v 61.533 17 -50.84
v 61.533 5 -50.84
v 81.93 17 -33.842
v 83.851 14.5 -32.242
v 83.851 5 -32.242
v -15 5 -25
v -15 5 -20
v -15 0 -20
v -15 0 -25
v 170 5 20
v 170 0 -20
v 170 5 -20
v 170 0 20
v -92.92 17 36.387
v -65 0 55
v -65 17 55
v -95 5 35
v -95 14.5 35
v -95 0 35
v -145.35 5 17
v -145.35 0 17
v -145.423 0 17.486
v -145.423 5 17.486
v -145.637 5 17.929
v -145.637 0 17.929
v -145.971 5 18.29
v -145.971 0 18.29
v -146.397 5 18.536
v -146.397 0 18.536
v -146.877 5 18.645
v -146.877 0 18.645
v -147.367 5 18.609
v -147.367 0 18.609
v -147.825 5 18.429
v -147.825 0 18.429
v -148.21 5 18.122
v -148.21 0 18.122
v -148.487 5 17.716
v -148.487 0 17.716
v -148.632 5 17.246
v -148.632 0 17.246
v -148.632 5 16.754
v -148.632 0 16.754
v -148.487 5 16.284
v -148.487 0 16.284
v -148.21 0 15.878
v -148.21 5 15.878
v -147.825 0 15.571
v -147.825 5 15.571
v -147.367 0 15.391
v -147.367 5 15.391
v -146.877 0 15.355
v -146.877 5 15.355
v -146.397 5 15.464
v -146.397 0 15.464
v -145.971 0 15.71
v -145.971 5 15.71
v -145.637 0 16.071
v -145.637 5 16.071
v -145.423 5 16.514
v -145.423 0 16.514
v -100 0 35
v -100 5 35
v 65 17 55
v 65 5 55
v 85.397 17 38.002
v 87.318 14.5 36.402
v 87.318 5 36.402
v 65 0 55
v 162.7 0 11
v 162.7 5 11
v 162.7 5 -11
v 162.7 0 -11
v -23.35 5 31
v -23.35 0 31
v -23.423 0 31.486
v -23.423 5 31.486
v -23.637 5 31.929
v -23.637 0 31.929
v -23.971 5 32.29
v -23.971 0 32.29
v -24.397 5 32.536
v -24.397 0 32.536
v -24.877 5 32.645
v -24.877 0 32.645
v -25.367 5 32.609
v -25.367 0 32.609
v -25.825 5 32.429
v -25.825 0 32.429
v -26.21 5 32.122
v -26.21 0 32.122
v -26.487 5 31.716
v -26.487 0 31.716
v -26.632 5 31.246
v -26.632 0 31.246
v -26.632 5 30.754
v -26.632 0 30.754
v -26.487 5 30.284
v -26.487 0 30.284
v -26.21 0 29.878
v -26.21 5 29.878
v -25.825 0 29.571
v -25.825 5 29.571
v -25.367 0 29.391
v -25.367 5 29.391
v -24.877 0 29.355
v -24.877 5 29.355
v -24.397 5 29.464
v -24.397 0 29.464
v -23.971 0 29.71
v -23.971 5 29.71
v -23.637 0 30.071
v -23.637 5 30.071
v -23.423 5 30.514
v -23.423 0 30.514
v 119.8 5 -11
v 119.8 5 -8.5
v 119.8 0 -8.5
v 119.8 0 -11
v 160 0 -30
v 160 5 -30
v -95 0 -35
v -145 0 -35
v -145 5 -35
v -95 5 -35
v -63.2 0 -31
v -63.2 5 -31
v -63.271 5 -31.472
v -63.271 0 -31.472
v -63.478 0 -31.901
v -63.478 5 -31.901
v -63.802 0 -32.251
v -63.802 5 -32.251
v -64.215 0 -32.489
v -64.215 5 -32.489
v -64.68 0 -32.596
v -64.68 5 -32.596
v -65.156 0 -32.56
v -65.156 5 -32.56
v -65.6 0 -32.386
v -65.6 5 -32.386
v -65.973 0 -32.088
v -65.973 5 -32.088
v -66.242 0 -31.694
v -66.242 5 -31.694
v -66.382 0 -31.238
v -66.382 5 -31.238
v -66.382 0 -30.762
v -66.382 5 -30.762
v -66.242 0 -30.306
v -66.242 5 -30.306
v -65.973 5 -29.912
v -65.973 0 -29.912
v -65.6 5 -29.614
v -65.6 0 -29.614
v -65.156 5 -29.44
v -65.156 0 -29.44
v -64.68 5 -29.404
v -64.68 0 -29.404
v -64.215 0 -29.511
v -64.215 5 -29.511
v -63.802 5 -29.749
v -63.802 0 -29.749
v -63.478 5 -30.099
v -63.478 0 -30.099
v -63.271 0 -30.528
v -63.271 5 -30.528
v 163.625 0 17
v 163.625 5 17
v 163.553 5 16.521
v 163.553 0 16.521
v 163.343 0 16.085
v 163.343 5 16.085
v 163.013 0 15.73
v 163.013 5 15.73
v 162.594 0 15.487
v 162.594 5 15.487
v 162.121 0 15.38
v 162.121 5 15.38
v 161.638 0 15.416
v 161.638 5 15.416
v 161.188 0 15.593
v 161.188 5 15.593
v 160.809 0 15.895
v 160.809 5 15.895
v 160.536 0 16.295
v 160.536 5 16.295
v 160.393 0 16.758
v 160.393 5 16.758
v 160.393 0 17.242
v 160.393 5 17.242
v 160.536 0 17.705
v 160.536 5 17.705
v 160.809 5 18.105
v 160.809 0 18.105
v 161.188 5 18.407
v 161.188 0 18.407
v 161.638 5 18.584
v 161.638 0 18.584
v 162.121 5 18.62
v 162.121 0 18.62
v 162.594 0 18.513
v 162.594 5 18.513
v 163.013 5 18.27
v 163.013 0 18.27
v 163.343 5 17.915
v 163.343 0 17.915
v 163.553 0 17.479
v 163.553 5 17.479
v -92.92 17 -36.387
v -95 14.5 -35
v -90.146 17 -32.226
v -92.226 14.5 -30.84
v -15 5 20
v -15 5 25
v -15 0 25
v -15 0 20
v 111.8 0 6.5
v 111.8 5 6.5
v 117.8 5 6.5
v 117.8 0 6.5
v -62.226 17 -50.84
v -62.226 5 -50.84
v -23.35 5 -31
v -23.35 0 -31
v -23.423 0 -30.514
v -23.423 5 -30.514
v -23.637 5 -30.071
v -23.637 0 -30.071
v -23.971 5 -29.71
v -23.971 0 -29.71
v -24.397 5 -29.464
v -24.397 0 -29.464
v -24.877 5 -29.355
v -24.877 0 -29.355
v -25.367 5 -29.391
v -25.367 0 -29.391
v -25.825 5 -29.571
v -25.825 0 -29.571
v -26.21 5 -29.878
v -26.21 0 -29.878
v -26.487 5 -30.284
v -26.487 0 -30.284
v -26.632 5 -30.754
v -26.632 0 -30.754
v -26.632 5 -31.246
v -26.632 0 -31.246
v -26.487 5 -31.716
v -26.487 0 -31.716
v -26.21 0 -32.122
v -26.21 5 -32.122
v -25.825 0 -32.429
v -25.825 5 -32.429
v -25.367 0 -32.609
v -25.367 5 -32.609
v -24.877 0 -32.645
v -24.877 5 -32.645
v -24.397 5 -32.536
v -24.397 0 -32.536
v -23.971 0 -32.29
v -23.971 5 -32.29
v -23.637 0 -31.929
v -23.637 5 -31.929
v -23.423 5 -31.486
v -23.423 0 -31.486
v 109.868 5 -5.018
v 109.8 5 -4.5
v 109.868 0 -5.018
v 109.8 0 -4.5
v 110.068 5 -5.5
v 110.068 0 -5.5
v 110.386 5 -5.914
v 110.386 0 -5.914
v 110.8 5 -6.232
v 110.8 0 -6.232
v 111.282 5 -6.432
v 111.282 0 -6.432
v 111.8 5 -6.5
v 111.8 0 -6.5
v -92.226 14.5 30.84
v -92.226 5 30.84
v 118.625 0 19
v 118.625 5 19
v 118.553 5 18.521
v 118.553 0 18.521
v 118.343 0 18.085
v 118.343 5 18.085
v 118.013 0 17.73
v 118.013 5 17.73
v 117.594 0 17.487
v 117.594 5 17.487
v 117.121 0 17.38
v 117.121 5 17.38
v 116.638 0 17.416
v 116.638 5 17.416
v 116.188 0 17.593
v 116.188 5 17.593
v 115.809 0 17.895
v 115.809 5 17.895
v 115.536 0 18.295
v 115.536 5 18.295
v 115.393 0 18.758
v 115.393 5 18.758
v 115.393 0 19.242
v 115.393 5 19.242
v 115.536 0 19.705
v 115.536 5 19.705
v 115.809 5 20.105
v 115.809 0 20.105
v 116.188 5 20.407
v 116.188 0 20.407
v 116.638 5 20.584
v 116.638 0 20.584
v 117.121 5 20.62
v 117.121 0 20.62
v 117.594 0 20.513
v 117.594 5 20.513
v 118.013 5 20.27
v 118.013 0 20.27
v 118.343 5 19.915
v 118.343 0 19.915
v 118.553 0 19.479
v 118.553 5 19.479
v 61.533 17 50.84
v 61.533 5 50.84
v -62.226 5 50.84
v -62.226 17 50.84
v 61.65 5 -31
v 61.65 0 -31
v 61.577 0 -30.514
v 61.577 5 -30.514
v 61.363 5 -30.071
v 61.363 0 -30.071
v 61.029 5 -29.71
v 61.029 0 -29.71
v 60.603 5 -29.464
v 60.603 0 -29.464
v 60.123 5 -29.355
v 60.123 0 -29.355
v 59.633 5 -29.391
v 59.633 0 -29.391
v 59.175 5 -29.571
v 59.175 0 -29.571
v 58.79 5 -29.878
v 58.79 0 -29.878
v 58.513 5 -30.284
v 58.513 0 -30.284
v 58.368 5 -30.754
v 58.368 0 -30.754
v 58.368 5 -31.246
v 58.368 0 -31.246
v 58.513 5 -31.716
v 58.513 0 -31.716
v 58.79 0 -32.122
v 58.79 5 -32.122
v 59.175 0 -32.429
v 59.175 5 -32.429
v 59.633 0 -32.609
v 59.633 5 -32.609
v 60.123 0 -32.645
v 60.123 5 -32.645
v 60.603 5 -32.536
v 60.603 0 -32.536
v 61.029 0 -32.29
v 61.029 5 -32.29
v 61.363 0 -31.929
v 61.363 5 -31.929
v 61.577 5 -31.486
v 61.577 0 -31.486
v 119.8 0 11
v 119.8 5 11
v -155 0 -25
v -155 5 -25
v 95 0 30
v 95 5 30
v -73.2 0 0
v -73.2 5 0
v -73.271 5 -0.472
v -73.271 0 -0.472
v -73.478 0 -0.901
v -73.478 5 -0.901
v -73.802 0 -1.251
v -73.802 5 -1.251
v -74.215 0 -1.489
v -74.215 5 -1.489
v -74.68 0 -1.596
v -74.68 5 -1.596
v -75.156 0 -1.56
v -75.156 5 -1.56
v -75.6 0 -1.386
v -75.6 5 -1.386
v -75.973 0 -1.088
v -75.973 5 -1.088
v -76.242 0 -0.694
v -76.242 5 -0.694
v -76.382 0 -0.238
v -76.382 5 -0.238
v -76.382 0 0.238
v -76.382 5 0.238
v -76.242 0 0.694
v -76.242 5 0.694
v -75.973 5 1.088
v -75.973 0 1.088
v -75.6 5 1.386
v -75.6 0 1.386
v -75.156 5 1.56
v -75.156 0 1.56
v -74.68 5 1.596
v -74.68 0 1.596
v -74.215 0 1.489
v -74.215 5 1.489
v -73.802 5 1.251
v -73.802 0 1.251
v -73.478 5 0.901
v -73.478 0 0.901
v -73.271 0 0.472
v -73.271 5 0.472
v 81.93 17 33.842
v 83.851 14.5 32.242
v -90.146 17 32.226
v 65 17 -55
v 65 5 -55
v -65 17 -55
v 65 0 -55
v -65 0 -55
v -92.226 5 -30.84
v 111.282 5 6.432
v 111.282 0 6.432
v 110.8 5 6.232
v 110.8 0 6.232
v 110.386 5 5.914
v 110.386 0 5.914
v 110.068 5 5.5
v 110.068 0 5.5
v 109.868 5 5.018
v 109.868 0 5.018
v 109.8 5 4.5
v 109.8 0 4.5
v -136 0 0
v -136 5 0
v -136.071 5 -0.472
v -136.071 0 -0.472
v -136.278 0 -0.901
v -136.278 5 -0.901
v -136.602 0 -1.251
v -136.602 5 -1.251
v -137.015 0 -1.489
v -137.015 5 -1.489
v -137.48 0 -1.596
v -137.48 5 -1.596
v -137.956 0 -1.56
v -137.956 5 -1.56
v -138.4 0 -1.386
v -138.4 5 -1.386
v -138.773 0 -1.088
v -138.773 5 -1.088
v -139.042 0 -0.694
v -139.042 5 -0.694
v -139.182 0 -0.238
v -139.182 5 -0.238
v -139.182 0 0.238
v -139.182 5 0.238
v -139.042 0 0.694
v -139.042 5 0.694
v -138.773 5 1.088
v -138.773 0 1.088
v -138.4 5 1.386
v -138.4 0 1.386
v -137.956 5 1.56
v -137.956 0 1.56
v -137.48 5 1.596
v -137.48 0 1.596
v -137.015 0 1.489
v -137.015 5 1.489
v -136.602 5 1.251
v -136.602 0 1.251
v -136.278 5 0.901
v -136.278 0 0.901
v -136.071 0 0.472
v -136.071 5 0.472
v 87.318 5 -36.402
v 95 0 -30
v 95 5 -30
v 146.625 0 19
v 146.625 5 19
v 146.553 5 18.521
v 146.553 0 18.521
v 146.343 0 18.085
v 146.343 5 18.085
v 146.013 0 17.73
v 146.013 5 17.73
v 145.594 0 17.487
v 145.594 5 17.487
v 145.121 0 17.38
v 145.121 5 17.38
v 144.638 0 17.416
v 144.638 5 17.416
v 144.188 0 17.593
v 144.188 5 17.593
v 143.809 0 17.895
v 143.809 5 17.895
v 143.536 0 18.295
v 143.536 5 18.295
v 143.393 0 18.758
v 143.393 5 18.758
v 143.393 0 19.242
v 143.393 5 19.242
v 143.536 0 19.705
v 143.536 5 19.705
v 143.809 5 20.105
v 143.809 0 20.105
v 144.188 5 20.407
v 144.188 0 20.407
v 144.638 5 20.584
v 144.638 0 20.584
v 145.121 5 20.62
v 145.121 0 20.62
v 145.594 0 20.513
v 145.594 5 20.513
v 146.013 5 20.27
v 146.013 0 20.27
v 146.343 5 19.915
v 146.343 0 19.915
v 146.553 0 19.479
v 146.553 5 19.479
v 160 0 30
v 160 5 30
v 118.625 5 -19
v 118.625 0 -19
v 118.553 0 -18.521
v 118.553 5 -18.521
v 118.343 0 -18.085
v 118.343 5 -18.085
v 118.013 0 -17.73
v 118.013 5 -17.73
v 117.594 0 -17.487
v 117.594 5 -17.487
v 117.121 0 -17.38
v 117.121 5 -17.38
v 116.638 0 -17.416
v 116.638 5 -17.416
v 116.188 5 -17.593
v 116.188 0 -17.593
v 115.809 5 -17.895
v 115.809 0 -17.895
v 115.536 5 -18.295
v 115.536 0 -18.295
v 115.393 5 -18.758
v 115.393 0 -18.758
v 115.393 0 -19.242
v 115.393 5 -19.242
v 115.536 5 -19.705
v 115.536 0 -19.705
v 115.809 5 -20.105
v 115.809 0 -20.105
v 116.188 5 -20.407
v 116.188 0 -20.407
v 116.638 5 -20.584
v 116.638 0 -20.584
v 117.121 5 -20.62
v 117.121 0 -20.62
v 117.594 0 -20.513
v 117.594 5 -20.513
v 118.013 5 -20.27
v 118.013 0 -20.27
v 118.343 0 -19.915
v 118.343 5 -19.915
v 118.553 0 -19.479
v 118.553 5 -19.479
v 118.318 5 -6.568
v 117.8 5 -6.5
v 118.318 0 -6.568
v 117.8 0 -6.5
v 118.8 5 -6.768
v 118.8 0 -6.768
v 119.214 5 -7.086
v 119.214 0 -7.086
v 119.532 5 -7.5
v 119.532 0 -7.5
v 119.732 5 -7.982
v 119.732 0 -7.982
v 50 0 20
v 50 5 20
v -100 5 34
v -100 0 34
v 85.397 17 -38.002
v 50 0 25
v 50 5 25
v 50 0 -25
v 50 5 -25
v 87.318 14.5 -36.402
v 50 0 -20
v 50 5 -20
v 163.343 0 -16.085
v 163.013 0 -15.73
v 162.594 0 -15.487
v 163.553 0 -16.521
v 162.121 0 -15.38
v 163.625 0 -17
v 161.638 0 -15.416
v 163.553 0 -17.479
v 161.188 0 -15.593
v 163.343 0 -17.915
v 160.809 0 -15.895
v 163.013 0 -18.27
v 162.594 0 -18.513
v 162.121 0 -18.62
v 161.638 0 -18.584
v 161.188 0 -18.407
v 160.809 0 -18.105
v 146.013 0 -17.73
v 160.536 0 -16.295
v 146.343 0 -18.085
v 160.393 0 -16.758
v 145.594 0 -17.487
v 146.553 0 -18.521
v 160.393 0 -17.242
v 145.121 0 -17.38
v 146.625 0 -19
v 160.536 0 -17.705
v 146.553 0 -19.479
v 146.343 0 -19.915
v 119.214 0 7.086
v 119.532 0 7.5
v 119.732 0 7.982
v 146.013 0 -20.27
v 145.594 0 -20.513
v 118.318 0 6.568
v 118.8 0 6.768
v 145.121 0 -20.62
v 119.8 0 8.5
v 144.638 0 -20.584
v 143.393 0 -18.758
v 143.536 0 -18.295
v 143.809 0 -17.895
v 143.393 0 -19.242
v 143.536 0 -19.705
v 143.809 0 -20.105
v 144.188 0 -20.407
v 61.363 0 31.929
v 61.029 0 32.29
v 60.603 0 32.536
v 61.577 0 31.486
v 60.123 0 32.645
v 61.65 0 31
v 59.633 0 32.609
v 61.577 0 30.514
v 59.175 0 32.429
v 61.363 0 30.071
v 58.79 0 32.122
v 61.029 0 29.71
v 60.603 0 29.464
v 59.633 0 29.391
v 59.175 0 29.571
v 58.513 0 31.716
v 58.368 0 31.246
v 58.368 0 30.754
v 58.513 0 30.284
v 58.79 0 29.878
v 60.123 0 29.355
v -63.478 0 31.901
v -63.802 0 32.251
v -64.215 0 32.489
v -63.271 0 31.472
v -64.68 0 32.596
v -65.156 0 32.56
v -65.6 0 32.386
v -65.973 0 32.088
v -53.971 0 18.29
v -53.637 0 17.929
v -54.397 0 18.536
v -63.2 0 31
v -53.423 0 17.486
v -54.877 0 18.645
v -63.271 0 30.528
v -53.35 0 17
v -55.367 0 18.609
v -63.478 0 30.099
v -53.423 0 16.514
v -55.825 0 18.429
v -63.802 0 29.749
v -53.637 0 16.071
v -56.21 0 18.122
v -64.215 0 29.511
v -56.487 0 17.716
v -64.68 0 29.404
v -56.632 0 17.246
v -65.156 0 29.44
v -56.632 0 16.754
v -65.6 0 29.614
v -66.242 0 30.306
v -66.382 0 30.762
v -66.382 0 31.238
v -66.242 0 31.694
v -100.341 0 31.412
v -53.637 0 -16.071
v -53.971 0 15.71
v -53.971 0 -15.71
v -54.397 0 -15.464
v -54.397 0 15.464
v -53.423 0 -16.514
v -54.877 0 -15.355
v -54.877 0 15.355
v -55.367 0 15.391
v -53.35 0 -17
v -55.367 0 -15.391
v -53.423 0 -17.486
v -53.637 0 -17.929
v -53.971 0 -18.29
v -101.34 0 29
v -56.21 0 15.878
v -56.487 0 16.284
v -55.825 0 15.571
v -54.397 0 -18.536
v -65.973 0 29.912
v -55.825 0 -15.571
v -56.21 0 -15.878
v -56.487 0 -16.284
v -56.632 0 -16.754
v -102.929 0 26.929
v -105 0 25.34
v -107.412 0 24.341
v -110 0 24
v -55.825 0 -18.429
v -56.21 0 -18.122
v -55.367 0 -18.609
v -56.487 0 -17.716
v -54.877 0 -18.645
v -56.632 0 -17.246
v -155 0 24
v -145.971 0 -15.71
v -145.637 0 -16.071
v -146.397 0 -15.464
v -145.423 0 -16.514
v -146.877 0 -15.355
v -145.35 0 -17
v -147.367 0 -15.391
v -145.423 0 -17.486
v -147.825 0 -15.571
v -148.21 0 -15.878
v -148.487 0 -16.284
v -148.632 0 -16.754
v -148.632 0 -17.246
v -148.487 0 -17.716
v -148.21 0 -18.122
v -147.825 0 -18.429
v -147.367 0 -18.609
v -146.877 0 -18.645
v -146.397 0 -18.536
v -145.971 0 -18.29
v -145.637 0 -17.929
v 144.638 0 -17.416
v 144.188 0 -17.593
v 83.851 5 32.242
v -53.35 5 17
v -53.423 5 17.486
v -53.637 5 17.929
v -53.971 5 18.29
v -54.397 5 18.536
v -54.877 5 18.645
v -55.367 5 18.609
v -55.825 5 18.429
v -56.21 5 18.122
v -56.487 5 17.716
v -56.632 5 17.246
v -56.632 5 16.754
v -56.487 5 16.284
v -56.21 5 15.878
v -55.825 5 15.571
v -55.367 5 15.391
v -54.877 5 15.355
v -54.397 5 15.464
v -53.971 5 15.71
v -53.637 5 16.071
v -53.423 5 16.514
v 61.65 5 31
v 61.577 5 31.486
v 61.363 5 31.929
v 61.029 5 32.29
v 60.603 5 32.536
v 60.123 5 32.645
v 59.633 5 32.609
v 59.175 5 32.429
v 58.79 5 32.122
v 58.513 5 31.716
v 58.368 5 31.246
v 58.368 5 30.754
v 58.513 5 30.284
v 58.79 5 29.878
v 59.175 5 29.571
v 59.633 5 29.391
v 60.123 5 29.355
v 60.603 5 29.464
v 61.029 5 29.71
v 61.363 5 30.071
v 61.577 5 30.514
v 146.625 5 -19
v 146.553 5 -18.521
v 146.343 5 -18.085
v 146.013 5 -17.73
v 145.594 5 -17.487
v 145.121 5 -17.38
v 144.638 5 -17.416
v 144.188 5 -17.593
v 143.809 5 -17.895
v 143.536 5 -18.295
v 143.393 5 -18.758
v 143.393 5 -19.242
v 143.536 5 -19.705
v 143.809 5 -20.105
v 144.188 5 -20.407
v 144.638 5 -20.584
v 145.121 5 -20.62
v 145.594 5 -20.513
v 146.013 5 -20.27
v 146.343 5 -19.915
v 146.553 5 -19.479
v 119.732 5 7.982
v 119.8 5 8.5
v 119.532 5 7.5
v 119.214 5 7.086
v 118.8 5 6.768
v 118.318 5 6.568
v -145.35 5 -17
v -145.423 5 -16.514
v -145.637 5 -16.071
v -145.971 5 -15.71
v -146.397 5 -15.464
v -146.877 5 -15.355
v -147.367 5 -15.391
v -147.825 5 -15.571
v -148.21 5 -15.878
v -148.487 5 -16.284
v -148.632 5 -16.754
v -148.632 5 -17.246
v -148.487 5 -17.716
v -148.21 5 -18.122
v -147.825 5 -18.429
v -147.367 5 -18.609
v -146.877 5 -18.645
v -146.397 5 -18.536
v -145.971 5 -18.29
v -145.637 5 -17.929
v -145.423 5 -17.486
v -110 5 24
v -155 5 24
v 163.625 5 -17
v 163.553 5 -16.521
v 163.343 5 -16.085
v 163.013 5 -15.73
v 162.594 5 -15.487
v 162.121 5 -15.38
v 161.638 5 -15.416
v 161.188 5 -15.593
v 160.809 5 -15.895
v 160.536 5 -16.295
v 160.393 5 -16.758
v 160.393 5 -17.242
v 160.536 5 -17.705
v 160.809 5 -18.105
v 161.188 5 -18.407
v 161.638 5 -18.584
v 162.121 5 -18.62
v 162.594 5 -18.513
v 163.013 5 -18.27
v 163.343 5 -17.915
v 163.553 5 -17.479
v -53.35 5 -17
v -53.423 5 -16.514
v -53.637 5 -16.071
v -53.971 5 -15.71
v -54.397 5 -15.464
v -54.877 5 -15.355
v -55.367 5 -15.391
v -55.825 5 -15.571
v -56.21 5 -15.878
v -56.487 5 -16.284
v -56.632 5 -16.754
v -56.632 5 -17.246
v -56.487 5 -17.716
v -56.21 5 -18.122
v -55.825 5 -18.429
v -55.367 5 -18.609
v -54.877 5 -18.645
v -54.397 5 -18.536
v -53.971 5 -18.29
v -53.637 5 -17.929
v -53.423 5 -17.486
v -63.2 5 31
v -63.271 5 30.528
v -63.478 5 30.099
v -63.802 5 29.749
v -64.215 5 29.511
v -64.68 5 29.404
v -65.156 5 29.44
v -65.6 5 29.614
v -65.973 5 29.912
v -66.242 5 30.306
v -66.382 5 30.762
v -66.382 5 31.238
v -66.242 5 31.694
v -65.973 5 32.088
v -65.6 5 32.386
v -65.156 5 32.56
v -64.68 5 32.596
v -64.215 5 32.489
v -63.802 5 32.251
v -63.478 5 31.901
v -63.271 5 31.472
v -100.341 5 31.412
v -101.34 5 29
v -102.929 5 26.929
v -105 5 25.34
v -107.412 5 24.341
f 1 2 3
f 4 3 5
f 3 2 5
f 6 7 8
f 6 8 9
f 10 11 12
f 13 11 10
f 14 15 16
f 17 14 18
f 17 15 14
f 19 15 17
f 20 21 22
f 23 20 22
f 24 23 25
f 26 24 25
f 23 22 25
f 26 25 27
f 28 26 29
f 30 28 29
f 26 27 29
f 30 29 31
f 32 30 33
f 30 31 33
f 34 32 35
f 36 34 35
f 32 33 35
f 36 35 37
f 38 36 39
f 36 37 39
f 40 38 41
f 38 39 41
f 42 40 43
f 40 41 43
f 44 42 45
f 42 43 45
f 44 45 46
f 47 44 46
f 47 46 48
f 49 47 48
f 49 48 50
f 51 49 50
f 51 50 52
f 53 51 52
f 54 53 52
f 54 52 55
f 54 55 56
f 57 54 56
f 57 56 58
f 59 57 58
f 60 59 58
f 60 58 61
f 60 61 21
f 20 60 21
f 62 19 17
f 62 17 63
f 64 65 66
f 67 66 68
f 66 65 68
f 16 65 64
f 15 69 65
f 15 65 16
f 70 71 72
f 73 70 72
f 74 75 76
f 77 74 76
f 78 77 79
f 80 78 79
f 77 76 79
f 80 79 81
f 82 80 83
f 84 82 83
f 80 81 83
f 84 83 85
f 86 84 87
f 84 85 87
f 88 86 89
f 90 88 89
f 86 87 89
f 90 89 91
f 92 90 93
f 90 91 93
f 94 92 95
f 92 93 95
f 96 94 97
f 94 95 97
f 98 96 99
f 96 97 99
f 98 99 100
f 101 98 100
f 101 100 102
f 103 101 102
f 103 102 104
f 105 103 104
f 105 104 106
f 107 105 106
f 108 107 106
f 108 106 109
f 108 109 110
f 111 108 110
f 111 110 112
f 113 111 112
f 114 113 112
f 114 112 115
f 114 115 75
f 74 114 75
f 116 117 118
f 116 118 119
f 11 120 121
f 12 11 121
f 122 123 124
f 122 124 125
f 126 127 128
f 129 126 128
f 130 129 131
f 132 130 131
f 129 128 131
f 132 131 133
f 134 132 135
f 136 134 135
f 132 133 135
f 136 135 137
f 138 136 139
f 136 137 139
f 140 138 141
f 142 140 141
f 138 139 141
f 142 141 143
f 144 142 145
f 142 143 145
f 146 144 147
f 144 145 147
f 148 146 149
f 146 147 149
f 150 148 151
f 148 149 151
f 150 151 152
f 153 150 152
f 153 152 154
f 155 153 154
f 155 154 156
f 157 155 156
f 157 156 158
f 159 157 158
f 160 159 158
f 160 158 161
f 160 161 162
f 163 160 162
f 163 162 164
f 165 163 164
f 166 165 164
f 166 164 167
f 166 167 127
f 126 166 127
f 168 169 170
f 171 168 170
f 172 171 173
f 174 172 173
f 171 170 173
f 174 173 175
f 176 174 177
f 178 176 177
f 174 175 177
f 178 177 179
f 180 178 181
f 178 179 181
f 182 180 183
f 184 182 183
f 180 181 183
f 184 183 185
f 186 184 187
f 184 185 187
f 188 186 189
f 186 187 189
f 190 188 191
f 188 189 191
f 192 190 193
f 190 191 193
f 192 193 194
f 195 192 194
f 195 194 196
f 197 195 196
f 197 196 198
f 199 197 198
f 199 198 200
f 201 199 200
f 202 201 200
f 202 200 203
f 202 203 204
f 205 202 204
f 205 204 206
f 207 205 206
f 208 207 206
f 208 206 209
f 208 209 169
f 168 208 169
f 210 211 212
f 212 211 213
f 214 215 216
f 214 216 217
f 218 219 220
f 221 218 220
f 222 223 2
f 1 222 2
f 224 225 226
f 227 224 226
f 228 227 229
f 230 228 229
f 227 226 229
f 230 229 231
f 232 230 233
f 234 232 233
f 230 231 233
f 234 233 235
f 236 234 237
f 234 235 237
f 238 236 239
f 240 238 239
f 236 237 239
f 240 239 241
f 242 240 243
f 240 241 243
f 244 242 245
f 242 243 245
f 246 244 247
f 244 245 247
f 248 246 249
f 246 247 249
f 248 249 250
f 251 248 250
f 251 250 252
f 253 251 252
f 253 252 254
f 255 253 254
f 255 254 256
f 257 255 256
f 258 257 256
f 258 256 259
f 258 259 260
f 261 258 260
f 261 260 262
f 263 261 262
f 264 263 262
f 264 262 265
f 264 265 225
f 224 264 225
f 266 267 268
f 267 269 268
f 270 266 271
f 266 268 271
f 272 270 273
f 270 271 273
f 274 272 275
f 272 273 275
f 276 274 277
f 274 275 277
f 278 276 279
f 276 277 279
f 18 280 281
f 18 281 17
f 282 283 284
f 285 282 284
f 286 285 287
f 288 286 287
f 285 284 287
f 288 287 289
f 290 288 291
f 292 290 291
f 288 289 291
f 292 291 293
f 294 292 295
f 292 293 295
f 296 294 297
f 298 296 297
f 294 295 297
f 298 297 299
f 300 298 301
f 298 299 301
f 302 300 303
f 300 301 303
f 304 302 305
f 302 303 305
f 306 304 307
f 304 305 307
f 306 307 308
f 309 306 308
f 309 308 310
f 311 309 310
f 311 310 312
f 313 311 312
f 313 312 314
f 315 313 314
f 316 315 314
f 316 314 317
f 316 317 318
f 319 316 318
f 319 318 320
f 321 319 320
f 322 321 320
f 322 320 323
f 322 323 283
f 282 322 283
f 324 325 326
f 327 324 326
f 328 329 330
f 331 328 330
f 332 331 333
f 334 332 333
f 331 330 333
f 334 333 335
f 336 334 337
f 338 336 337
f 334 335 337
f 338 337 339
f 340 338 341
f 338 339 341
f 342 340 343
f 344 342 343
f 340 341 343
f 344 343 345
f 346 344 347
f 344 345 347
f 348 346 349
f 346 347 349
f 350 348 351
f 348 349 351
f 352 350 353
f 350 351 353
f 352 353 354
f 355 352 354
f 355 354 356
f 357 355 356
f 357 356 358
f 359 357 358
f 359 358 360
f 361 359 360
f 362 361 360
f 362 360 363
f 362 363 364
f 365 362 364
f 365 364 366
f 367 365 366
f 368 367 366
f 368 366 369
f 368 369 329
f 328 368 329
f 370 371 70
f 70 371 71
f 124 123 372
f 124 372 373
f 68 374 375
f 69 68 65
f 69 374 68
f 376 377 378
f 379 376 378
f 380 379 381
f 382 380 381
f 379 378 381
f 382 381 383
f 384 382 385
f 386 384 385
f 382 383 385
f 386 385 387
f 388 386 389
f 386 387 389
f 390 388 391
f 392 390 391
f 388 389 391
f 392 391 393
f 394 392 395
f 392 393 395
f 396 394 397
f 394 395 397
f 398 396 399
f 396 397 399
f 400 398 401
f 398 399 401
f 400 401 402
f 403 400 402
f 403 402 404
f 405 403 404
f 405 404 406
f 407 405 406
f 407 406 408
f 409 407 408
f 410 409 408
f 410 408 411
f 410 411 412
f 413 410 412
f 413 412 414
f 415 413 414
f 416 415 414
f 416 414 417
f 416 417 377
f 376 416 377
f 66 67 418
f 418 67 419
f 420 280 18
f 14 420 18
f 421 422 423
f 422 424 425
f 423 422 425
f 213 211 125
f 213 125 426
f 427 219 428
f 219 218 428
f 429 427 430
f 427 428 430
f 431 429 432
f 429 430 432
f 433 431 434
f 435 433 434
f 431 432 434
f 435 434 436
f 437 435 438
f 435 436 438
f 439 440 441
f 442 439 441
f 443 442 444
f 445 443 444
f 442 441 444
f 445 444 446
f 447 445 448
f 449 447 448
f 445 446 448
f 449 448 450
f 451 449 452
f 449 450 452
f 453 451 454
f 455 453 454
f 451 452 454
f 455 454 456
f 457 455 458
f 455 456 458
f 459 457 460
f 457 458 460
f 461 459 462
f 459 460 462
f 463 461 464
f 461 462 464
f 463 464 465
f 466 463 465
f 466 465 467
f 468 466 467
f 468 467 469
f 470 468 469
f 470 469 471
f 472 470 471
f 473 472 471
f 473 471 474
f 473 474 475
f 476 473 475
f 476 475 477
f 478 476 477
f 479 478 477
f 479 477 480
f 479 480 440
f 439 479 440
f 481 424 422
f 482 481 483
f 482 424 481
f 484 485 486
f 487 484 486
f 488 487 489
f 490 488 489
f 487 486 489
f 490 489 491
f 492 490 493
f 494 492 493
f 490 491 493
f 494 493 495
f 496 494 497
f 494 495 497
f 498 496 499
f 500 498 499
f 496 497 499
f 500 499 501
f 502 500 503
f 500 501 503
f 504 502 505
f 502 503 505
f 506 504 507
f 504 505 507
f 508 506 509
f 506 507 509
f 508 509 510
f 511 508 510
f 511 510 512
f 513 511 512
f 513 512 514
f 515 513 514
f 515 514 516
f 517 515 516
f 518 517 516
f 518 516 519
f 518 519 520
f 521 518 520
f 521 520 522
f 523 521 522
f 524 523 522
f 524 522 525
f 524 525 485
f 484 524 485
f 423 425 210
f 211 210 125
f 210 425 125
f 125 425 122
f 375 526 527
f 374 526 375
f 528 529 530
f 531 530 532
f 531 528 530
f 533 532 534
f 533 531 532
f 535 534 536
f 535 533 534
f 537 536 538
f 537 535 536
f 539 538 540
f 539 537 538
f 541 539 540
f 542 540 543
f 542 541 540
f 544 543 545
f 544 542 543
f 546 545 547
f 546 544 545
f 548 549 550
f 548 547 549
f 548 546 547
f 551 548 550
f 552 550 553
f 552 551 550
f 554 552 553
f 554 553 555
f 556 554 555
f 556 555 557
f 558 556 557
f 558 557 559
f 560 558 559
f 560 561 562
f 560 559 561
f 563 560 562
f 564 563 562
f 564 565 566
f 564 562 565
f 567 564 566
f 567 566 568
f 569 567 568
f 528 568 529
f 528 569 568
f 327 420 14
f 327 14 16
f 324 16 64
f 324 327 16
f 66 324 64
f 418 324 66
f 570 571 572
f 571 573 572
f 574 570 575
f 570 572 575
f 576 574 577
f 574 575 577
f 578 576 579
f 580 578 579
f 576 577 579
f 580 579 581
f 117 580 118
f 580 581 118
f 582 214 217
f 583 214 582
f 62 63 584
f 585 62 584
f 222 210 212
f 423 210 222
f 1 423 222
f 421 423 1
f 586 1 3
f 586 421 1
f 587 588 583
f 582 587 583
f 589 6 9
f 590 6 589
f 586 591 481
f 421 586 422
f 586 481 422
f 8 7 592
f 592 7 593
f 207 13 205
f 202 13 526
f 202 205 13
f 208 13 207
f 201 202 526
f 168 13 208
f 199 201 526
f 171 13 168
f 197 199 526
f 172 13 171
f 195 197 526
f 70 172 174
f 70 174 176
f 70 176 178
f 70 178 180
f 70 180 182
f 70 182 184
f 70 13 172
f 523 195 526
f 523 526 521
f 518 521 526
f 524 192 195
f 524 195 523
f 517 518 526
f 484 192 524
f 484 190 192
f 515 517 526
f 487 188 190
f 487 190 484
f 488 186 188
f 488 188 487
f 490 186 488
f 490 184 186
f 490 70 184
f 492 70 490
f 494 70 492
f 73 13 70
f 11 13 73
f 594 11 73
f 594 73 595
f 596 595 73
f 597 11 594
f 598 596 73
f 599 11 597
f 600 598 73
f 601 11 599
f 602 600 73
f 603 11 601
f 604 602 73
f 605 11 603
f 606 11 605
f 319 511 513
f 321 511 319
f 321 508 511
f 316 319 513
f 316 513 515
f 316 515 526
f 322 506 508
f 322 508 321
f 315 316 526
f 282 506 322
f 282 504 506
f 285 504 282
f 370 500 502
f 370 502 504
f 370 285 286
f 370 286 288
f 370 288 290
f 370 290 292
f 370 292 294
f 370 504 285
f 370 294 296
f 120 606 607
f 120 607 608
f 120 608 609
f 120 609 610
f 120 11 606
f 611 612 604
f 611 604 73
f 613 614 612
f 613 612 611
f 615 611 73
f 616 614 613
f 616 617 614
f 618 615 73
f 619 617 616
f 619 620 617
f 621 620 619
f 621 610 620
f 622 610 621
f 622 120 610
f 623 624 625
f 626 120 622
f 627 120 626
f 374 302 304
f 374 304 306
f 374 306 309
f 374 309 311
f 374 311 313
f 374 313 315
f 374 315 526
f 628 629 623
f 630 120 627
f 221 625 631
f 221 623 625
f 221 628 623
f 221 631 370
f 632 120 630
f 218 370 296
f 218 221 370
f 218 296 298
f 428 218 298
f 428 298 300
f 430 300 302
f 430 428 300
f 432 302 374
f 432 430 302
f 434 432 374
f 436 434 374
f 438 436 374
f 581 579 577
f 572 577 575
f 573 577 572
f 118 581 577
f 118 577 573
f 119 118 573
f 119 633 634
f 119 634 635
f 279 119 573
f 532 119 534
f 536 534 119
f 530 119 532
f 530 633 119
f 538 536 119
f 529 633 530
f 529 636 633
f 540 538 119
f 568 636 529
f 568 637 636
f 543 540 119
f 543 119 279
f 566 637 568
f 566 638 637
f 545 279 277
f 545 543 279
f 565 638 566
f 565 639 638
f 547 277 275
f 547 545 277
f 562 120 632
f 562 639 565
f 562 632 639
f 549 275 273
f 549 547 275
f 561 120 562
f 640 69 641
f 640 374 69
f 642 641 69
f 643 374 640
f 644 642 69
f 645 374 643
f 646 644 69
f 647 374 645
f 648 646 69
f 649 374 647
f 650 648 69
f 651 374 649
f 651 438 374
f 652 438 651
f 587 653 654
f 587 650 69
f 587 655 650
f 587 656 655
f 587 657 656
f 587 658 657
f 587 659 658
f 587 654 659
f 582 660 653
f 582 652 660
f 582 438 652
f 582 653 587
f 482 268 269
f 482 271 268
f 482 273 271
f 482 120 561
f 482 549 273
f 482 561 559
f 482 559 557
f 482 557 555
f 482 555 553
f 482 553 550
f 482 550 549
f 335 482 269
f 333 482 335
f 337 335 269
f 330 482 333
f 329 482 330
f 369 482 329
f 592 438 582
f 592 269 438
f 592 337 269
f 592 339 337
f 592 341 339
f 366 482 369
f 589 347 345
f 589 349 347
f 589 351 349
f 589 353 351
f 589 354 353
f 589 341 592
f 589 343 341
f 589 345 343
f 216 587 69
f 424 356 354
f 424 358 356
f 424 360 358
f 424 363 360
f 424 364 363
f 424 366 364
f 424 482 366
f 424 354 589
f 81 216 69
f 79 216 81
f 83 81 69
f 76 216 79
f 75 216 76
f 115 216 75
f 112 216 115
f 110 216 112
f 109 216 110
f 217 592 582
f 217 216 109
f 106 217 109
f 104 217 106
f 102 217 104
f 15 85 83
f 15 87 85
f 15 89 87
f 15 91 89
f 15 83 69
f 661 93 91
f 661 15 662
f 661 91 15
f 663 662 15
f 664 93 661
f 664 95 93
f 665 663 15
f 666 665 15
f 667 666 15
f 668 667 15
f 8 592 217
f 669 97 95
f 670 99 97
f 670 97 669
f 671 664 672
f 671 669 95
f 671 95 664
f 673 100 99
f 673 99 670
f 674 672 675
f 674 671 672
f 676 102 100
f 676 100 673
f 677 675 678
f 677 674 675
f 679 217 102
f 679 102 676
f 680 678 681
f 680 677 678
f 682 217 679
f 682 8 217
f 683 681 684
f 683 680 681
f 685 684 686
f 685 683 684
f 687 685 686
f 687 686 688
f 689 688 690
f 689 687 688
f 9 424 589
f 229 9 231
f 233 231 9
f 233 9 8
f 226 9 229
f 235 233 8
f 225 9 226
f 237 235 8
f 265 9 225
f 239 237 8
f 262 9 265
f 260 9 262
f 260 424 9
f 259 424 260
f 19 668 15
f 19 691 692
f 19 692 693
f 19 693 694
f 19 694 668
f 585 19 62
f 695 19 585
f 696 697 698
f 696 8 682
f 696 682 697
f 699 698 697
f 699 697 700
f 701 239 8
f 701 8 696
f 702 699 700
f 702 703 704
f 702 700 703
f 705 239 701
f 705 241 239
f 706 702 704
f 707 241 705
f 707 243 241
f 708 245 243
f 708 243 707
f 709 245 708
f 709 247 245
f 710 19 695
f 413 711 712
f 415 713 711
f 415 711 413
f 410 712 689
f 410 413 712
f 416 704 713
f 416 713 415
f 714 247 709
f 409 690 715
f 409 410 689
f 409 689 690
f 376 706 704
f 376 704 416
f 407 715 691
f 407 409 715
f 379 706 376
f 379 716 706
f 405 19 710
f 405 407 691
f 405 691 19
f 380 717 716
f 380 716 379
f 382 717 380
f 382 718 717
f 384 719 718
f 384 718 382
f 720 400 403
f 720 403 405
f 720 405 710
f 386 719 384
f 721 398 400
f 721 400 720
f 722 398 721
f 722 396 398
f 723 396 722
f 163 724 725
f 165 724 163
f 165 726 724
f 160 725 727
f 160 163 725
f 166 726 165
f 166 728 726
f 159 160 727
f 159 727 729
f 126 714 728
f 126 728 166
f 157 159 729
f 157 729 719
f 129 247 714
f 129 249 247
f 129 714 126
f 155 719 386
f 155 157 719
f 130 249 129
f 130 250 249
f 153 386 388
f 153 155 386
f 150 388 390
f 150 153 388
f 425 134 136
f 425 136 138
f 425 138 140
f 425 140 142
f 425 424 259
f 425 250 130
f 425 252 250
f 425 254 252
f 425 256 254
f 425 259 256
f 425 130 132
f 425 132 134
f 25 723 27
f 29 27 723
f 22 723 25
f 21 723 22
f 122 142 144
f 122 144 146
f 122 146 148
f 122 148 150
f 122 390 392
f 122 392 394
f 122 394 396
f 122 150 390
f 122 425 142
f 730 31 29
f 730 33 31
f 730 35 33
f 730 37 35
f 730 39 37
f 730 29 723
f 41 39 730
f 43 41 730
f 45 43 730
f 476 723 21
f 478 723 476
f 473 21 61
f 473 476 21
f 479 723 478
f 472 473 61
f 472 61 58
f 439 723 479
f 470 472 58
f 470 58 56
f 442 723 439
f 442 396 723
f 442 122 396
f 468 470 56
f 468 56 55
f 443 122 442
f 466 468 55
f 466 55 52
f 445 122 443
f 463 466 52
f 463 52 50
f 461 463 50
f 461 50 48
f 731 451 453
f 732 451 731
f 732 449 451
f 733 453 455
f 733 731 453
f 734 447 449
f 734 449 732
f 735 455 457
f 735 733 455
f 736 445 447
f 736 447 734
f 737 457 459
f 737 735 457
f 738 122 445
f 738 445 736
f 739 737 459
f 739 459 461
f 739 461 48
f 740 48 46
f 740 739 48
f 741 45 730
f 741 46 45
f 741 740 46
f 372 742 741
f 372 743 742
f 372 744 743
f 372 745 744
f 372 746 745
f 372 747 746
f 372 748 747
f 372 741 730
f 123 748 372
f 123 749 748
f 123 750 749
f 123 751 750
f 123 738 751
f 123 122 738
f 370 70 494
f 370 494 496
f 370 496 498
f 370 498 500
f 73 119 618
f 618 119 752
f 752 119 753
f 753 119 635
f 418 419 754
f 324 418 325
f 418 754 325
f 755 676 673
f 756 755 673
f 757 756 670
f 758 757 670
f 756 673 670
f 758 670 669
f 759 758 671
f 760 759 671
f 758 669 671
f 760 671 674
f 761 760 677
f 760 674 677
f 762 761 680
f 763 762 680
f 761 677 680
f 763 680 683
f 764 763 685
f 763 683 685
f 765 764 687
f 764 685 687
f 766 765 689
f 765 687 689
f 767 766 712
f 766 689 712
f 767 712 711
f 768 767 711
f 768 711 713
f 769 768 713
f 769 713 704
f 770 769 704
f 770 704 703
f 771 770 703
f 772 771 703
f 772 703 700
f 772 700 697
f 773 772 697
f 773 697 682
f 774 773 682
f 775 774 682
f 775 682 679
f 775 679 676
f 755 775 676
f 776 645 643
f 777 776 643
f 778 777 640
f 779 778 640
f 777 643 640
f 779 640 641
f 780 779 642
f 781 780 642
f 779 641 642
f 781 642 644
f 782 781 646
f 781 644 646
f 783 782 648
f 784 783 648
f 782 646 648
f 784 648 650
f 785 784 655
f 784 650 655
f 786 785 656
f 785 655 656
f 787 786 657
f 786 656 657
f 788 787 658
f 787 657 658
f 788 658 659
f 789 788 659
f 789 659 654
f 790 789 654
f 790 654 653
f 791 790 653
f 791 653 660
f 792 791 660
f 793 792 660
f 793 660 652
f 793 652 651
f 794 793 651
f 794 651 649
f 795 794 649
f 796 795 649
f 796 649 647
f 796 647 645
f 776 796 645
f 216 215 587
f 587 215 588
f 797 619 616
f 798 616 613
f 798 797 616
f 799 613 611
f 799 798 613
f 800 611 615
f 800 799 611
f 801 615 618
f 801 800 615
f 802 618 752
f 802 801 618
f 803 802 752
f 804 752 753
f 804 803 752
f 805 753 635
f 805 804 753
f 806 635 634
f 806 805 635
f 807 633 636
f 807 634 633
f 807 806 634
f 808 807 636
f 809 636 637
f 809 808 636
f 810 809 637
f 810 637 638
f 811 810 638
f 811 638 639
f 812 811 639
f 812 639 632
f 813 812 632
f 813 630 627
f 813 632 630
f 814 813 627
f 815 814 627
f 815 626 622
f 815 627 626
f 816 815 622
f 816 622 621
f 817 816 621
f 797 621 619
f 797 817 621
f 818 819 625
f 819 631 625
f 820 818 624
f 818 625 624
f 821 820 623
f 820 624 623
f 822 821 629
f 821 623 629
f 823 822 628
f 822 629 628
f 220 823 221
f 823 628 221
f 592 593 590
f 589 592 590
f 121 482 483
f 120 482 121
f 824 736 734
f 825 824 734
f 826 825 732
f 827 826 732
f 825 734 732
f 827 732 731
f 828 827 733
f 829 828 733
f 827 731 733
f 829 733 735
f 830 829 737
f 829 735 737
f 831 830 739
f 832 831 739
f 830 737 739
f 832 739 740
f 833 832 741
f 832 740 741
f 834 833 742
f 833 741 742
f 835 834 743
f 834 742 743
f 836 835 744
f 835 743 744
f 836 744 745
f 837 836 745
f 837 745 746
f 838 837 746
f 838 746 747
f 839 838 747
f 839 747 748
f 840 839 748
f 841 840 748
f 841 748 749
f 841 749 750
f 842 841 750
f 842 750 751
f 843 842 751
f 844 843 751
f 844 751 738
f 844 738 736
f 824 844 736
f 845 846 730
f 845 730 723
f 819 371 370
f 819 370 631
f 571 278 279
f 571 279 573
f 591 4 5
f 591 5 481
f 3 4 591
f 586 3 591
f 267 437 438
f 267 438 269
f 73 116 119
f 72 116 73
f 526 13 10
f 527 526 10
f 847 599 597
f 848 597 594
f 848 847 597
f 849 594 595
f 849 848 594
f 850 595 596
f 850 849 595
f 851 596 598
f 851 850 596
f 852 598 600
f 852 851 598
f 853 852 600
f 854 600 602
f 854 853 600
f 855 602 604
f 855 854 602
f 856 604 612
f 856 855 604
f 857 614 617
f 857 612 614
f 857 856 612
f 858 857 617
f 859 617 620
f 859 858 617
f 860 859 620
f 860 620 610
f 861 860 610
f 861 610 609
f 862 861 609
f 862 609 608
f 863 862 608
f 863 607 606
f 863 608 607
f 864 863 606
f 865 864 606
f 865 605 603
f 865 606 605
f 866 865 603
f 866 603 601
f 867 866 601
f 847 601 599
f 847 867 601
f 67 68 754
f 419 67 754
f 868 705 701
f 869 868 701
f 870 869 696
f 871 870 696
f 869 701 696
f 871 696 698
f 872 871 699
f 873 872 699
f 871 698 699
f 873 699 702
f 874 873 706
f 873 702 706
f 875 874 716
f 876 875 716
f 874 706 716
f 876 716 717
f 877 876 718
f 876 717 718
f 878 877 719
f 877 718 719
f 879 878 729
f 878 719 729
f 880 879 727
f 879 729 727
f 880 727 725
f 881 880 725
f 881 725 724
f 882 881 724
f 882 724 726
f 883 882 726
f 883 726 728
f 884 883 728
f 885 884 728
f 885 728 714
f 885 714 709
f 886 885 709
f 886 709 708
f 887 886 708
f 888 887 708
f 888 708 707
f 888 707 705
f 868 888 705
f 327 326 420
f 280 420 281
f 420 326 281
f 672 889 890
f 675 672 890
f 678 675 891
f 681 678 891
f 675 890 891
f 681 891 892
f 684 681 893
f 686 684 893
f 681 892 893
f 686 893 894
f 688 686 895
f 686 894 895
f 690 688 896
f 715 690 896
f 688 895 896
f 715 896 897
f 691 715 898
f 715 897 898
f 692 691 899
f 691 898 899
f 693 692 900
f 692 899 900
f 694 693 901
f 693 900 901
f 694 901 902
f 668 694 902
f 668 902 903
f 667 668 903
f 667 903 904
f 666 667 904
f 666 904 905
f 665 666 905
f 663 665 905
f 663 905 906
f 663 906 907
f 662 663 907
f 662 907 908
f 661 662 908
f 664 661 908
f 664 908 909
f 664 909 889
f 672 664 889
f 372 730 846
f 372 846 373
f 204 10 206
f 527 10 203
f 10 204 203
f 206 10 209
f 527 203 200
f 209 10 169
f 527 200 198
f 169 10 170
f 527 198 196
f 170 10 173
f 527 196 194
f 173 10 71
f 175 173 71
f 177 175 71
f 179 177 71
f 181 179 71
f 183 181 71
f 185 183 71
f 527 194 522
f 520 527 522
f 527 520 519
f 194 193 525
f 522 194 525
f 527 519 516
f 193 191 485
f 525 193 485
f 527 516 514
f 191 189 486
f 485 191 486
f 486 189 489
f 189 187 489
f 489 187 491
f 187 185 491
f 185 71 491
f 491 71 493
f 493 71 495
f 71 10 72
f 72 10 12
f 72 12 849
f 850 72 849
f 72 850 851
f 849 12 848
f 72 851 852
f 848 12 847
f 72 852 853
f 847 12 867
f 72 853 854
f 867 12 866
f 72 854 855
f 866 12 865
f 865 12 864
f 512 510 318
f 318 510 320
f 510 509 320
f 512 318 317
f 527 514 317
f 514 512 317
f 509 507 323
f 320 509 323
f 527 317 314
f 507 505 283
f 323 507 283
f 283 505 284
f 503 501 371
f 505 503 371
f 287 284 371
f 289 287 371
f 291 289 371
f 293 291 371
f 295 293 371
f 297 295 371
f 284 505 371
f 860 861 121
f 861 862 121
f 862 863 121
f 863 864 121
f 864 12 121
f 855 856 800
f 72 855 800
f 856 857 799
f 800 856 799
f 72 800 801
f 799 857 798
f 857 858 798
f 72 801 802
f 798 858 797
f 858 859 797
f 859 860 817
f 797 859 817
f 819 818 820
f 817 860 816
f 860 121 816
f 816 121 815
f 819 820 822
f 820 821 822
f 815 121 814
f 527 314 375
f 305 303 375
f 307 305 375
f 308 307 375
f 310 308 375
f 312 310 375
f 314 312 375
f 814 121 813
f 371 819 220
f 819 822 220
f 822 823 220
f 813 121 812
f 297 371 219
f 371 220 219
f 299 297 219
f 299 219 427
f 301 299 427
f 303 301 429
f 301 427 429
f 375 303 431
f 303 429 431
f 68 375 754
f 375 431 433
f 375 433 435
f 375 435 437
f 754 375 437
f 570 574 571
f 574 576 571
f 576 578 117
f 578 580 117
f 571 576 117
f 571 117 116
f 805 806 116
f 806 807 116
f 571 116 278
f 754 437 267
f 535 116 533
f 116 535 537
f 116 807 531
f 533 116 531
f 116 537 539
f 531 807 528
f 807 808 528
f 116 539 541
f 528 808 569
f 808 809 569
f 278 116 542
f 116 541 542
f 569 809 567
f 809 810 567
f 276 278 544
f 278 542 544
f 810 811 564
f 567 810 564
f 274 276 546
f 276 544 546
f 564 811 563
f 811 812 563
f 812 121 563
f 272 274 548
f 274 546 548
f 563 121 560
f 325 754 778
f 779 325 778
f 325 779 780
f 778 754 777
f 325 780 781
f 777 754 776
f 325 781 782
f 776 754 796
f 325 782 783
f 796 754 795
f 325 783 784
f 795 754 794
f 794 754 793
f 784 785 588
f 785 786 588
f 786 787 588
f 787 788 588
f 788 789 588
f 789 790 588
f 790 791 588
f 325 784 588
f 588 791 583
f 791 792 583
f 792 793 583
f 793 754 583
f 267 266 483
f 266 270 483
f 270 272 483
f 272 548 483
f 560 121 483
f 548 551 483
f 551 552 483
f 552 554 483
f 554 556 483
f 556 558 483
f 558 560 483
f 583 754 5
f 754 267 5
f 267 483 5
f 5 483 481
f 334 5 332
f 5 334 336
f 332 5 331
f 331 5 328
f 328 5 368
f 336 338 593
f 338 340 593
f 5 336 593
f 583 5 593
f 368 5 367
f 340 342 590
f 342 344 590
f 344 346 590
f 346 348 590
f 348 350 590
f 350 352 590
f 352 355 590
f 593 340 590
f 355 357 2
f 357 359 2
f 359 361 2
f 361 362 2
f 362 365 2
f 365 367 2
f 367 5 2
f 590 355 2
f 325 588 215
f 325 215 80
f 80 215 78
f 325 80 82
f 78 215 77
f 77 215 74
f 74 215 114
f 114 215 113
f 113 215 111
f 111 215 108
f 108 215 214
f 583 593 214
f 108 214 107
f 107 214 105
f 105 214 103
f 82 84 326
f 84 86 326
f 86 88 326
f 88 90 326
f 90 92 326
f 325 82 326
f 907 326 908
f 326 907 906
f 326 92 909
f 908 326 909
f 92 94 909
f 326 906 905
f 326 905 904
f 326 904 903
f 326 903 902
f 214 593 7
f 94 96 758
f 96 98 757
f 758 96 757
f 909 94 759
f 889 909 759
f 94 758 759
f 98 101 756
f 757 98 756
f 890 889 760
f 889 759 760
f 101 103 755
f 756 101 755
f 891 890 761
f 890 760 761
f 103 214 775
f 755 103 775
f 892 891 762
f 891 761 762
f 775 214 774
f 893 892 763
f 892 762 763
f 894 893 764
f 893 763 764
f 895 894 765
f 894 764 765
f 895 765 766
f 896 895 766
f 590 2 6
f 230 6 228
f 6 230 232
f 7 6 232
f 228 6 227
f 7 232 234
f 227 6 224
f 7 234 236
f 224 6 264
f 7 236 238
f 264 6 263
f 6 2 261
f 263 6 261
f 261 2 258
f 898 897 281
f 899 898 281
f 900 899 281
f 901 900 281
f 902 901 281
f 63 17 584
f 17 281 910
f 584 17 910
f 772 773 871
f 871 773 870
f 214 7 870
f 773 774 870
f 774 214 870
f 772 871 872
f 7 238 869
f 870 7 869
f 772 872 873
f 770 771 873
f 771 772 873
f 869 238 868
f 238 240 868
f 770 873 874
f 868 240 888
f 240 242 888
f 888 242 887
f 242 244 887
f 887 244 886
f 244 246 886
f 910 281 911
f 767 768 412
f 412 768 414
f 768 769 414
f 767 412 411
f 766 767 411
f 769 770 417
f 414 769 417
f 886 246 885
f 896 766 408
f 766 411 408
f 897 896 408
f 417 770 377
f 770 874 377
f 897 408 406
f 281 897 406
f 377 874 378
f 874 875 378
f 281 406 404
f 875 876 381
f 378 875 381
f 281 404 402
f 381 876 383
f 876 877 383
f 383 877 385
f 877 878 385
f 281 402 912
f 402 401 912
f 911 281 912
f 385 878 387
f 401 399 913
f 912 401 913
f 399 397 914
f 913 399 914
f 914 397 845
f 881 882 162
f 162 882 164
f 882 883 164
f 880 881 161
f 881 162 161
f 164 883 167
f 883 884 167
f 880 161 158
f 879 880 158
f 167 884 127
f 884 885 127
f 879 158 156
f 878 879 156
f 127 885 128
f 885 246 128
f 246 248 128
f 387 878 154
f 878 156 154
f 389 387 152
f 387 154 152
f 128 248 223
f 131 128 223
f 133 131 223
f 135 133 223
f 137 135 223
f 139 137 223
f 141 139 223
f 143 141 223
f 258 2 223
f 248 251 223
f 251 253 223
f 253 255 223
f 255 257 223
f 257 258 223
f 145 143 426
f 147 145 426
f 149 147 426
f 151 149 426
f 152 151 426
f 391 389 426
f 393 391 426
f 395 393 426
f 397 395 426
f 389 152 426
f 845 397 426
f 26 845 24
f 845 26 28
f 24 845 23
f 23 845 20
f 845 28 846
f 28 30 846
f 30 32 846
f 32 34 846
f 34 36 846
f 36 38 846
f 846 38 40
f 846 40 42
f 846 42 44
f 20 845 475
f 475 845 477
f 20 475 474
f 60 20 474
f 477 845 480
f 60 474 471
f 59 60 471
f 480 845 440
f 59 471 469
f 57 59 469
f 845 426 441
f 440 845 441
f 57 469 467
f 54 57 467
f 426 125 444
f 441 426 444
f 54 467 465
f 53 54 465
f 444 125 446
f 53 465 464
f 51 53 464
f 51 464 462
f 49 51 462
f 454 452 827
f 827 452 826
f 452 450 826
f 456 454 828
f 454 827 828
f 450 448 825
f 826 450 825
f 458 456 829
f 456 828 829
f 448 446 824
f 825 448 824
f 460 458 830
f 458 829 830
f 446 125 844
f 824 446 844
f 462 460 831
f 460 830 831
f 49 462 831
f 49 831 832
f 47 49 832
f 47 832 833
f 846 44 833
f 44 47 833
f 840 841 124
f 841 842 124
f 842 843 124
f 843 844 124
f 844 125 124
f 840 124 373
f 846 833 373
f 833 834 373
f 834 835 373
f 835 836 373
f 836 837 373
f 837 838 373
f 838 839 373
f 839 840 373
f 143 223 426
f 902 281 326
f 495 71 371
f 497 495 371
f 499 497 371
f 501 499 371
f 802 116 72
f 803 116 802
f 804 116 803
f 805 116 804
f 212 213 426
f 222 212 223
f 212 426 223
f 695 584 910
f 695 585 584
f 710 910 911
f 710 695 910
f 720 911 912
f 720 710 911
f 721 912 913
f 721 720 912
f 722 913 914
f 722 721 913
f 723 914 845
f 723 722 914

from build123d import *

# Parameters (mm, degrees)
BOSS_EXTRUDE1_DEPTH      = 5
CHASSIS_WALLS1_DEPTH     = 12
CHAMFER1_SIZE            = 10
CHAMFER2_SIZE            = 10
CHAMFER3_SIZE            = 2.5
SKETCH4_R                = 1.65
CUT_EXTRUDE1_DEPTH       = 10
SKETCH5_W                = 55
SKETCH5_H                = 11
CUT_EXTRUDE2_DEPTH       = 10
SKETCH6_W                = 65
SKETCH6_H                = 5
CUT_EXTRUDE3_DEPTH       = 6
FILLET1_R                = 10
SKETCH7_W                = 42.9
SKETCH7_H                = 22
CUT_EXTRUDE4_DEPTH       = 6
SKETCH9_R                = 1.625
CUT_EXTRUDE5_DEPTH       = 6
SKETCH10_W               = 10
SKETCH10_H               = 13
SERVO_CABLE_CUTOUT_DEPTH = 10
FILLET2_R                = 2
SKETCH11_R               = 1.6
CUT_EXTRUDE6_DEPTH       = 6


with BuildPart() as part:
    # Sketch1 → Boss-Extrude1 (new body)
    with BuildSketch(Plane(origin=(0, 0, 0), x_dir=(1, 0, 0), z_dir=(0, 1, 0))):
        Polygon((-95, 35), (-65, 55), (65, 55), (95, 30), (170, 30), (170, -30), (95, -30), (65, -55), (-65, -55), (-95, -35), (-155, -35), (-155, 35), align=None)
    extrude(amount=BOSS_EXTRUDE1_DEPTH)

    # Sketch3 → Chassis-Walls1 (add)
    with BuildSketch(Plane(origin=(0, 5, 0), x_dir=(1, 0, 0), z_dir=(0, 1, 0))):
        Polygon((0, 55), (-65, 55), (-95, 35), (-92.226499019, 30.839748528), (-62.226499019, 50.839748528), (0, 50.839748528), (61.533123774, 50.839748528), (83.850910978, 32.241592525), (87.317787204, 36.401843997), (65, 55), align=None)
        Polygon((61.533123774, -50.839748528), (0, -50.839748528), (-62.226499019, -50.839748528), (-92.226499019, -30.839748528), (-95, -35), (-65, -55), (0, -55), (65, -55), (87.317787204, -36.401843997), (83.850910978, -32.241592525), align=None)
    extrude(amount=CHASSIS_WALLS1_DEPTH)

    # Chamfer1
    chamfer1_edges = [part.edges().sort_by_distance(p)[0] for p in [
        (-155, 2.5, 35),
        (-155, 2.5, -35),
    ]]
    chamfer(chamfer1_edges, length=CHAMFER1_SIZE)

    # Chamfer2
    chamfer2_edges = [part.edges().sort_by_distance(p)[0] for p in [
        (170, 2.5, -30),
        (170, 2.5, 30),
    ]]
    chamfer(chamfer2_edges, length=CHAMFER2_SIZE)

    # Chamfer3
    chamfer3_edges = [part.edges().sort_by_distance(p)[0] for p in [
        (-93.613249509, 17, -32.919874264),
        (85.584349091, 17, -34.321718261),
        (-93.613249509, 17, 32.919874264),
        (85.584349091, 17, 34.321718261),
    ]]
    chamfer(chamfer3_edges, length=CHAMFER3_SIZE)

    # Sketch4 → Cut-Extrude1 (cut)
    with BuildSketch(Plane.XZ):
        with Locations((-147, 17)):
            Circle(SKETCH4_R)
        with Locations((-55, 17)):
            Circle(SKETCH4_R)
        with Locations((-55, -17)):
            Circle(SKETCH4_R)
        with Locations((-147, -17)):
            Circle(SKETCH4_R)
        with Locations((-25, 31)):
            Circle(SKETCH4_R)
        with Locations((60, 31)):
            Circle(SKETCH4_R)
        with Locations((60, -31)):
            Circle(SKETCH4_R)
        with Locations((-25, -31)):
            Circle(SKETCH4_R)
    extrude(amount=-CUT_EXTRUDE1_DEPTH, mode=Mode.SUBTRACT)

    # Sketch5 → Cut-Extrude2 (cut)
    with BuildSketch(Plane(origin=(0, 5, 0), x_dir=(1, 0, 0), z_dir=(0, 1, 0))):
        with Locations((-127.5, -29.5)):
            Rectangle(SKETCH5_W, SKETCH5_H)
    extrude(amount=-CUT_EXTRUDE2_DEPTH, mode=Mode.SUBTRACT)

    # Sketch6 → Cut-Extrude3 (cut, through all)
    with BuildSketch(Plane(origin=(0, 5, 0), x_dir=(1, 0, 0), z_dir=(0, 1, 0))):
        with Locations((17.5, 22.5)):
            Rectangle(SKETCH6_W, SKETCH6_H)
        with Locations((17.5, -22.5)):
            Rectangle(SKETCH6_W, SKETCH6_H)
    extrude(amount=-CUT_EXTRUDE3_DEPTH, mode=Mode.SUBTRACT)

    # Fillet1
    fillet1_edges = [part.edges().sort_by_distance(p)[0] for p in [
        (-100, 2.5, 24),
    ]]
    fillet(fillet1_edges, radius=FILLET1_R)

    # Sketch7 → Cut-Extrude4 (cut, through all)
    with BuildSketch(Plane(origin=(0, 5, 0), x_dir=(1, 0, 0), z_dir=(0, 1, 0))):
        with Locations((141.25, 0)):
            Rectangle(SKETCH7_W, SKETCH7_H)
    extrude(amount=-CUT_EXTRUDE4_DEPTH, mode=Mode.SUBTRACT)

    # Sketch9 → Cut-Extrude5 (cut, through all)
    with BuildSketch(Plane(origin=(0, 5, 0), x_dir=(1, 0, 0), z_dir=(0, 1, 0))):
        with Locations((117, -19)):
            Circle(SKETCH9_R)
        with Locations((145, -19)):
            Circle(SKETCH9_R)
        with Locations((162, -17)):
            Circle(SKETCH9_R)
    cut_extrude5 = extrude(amount=-CUT_EXTRUDE5_DEPTH, mode=Mode.SUBTRACT)

    # Mirror1: Cut-Extrude5 across plane
    add(cut_extrude5.mirror(Plane.XY), mode=Mode.SUBTRACT)

    # Sketch10 → Servo-Cable-Cutout (cut)
    with BuildSketch(Plane(origin=(0, 5, 0), x_dir=(1, 0, 0), z_dir=(0, 1, 0))):
        with Locations((114.8, 0)):
            Rectangle(SKETCH10_W, SKETCH10_H)
    extrude(amount=-SERVO_CABLE_CUTOUT_DEPTH, mode=Mode.SUBTRACT)

    # Fillet2
    fillet2_edges = [part.edges().sort_by_distance(p)[0] for p in [
        (119.8, 2.5, -6.5),
        (119.8, 2.5, 6.5),
        (109.8, 2.5, 6.5),
        (109.8, 2.5, -6.5),
    ]]
    fillet(fillet2_edges, radius=FILLET2_R)

    # Sketch11 → Cut-Extrude6 (cut, through all)
    with BuildSketch(Plane(origin=(0, 5, 0), x_dir=(1, 0, 0), z_dir=(0, 1, 0))):
        with Locations((-137.6, 0)):
            Circle(SKETCH11_R)
        with Locations((-74.8, 0)):
            Circle(SKETCH11_R)
        with Locations((-64.8, 31)):
            Circle(SKETCH11_R)
        with Locations((-64.8, -31)):
            Circle(SKETCH11_R)
    extrude(amount=-CUT_EXTRUDE6_DEPTH, mode=Mode.SUBTRACT)


solid = part.part
